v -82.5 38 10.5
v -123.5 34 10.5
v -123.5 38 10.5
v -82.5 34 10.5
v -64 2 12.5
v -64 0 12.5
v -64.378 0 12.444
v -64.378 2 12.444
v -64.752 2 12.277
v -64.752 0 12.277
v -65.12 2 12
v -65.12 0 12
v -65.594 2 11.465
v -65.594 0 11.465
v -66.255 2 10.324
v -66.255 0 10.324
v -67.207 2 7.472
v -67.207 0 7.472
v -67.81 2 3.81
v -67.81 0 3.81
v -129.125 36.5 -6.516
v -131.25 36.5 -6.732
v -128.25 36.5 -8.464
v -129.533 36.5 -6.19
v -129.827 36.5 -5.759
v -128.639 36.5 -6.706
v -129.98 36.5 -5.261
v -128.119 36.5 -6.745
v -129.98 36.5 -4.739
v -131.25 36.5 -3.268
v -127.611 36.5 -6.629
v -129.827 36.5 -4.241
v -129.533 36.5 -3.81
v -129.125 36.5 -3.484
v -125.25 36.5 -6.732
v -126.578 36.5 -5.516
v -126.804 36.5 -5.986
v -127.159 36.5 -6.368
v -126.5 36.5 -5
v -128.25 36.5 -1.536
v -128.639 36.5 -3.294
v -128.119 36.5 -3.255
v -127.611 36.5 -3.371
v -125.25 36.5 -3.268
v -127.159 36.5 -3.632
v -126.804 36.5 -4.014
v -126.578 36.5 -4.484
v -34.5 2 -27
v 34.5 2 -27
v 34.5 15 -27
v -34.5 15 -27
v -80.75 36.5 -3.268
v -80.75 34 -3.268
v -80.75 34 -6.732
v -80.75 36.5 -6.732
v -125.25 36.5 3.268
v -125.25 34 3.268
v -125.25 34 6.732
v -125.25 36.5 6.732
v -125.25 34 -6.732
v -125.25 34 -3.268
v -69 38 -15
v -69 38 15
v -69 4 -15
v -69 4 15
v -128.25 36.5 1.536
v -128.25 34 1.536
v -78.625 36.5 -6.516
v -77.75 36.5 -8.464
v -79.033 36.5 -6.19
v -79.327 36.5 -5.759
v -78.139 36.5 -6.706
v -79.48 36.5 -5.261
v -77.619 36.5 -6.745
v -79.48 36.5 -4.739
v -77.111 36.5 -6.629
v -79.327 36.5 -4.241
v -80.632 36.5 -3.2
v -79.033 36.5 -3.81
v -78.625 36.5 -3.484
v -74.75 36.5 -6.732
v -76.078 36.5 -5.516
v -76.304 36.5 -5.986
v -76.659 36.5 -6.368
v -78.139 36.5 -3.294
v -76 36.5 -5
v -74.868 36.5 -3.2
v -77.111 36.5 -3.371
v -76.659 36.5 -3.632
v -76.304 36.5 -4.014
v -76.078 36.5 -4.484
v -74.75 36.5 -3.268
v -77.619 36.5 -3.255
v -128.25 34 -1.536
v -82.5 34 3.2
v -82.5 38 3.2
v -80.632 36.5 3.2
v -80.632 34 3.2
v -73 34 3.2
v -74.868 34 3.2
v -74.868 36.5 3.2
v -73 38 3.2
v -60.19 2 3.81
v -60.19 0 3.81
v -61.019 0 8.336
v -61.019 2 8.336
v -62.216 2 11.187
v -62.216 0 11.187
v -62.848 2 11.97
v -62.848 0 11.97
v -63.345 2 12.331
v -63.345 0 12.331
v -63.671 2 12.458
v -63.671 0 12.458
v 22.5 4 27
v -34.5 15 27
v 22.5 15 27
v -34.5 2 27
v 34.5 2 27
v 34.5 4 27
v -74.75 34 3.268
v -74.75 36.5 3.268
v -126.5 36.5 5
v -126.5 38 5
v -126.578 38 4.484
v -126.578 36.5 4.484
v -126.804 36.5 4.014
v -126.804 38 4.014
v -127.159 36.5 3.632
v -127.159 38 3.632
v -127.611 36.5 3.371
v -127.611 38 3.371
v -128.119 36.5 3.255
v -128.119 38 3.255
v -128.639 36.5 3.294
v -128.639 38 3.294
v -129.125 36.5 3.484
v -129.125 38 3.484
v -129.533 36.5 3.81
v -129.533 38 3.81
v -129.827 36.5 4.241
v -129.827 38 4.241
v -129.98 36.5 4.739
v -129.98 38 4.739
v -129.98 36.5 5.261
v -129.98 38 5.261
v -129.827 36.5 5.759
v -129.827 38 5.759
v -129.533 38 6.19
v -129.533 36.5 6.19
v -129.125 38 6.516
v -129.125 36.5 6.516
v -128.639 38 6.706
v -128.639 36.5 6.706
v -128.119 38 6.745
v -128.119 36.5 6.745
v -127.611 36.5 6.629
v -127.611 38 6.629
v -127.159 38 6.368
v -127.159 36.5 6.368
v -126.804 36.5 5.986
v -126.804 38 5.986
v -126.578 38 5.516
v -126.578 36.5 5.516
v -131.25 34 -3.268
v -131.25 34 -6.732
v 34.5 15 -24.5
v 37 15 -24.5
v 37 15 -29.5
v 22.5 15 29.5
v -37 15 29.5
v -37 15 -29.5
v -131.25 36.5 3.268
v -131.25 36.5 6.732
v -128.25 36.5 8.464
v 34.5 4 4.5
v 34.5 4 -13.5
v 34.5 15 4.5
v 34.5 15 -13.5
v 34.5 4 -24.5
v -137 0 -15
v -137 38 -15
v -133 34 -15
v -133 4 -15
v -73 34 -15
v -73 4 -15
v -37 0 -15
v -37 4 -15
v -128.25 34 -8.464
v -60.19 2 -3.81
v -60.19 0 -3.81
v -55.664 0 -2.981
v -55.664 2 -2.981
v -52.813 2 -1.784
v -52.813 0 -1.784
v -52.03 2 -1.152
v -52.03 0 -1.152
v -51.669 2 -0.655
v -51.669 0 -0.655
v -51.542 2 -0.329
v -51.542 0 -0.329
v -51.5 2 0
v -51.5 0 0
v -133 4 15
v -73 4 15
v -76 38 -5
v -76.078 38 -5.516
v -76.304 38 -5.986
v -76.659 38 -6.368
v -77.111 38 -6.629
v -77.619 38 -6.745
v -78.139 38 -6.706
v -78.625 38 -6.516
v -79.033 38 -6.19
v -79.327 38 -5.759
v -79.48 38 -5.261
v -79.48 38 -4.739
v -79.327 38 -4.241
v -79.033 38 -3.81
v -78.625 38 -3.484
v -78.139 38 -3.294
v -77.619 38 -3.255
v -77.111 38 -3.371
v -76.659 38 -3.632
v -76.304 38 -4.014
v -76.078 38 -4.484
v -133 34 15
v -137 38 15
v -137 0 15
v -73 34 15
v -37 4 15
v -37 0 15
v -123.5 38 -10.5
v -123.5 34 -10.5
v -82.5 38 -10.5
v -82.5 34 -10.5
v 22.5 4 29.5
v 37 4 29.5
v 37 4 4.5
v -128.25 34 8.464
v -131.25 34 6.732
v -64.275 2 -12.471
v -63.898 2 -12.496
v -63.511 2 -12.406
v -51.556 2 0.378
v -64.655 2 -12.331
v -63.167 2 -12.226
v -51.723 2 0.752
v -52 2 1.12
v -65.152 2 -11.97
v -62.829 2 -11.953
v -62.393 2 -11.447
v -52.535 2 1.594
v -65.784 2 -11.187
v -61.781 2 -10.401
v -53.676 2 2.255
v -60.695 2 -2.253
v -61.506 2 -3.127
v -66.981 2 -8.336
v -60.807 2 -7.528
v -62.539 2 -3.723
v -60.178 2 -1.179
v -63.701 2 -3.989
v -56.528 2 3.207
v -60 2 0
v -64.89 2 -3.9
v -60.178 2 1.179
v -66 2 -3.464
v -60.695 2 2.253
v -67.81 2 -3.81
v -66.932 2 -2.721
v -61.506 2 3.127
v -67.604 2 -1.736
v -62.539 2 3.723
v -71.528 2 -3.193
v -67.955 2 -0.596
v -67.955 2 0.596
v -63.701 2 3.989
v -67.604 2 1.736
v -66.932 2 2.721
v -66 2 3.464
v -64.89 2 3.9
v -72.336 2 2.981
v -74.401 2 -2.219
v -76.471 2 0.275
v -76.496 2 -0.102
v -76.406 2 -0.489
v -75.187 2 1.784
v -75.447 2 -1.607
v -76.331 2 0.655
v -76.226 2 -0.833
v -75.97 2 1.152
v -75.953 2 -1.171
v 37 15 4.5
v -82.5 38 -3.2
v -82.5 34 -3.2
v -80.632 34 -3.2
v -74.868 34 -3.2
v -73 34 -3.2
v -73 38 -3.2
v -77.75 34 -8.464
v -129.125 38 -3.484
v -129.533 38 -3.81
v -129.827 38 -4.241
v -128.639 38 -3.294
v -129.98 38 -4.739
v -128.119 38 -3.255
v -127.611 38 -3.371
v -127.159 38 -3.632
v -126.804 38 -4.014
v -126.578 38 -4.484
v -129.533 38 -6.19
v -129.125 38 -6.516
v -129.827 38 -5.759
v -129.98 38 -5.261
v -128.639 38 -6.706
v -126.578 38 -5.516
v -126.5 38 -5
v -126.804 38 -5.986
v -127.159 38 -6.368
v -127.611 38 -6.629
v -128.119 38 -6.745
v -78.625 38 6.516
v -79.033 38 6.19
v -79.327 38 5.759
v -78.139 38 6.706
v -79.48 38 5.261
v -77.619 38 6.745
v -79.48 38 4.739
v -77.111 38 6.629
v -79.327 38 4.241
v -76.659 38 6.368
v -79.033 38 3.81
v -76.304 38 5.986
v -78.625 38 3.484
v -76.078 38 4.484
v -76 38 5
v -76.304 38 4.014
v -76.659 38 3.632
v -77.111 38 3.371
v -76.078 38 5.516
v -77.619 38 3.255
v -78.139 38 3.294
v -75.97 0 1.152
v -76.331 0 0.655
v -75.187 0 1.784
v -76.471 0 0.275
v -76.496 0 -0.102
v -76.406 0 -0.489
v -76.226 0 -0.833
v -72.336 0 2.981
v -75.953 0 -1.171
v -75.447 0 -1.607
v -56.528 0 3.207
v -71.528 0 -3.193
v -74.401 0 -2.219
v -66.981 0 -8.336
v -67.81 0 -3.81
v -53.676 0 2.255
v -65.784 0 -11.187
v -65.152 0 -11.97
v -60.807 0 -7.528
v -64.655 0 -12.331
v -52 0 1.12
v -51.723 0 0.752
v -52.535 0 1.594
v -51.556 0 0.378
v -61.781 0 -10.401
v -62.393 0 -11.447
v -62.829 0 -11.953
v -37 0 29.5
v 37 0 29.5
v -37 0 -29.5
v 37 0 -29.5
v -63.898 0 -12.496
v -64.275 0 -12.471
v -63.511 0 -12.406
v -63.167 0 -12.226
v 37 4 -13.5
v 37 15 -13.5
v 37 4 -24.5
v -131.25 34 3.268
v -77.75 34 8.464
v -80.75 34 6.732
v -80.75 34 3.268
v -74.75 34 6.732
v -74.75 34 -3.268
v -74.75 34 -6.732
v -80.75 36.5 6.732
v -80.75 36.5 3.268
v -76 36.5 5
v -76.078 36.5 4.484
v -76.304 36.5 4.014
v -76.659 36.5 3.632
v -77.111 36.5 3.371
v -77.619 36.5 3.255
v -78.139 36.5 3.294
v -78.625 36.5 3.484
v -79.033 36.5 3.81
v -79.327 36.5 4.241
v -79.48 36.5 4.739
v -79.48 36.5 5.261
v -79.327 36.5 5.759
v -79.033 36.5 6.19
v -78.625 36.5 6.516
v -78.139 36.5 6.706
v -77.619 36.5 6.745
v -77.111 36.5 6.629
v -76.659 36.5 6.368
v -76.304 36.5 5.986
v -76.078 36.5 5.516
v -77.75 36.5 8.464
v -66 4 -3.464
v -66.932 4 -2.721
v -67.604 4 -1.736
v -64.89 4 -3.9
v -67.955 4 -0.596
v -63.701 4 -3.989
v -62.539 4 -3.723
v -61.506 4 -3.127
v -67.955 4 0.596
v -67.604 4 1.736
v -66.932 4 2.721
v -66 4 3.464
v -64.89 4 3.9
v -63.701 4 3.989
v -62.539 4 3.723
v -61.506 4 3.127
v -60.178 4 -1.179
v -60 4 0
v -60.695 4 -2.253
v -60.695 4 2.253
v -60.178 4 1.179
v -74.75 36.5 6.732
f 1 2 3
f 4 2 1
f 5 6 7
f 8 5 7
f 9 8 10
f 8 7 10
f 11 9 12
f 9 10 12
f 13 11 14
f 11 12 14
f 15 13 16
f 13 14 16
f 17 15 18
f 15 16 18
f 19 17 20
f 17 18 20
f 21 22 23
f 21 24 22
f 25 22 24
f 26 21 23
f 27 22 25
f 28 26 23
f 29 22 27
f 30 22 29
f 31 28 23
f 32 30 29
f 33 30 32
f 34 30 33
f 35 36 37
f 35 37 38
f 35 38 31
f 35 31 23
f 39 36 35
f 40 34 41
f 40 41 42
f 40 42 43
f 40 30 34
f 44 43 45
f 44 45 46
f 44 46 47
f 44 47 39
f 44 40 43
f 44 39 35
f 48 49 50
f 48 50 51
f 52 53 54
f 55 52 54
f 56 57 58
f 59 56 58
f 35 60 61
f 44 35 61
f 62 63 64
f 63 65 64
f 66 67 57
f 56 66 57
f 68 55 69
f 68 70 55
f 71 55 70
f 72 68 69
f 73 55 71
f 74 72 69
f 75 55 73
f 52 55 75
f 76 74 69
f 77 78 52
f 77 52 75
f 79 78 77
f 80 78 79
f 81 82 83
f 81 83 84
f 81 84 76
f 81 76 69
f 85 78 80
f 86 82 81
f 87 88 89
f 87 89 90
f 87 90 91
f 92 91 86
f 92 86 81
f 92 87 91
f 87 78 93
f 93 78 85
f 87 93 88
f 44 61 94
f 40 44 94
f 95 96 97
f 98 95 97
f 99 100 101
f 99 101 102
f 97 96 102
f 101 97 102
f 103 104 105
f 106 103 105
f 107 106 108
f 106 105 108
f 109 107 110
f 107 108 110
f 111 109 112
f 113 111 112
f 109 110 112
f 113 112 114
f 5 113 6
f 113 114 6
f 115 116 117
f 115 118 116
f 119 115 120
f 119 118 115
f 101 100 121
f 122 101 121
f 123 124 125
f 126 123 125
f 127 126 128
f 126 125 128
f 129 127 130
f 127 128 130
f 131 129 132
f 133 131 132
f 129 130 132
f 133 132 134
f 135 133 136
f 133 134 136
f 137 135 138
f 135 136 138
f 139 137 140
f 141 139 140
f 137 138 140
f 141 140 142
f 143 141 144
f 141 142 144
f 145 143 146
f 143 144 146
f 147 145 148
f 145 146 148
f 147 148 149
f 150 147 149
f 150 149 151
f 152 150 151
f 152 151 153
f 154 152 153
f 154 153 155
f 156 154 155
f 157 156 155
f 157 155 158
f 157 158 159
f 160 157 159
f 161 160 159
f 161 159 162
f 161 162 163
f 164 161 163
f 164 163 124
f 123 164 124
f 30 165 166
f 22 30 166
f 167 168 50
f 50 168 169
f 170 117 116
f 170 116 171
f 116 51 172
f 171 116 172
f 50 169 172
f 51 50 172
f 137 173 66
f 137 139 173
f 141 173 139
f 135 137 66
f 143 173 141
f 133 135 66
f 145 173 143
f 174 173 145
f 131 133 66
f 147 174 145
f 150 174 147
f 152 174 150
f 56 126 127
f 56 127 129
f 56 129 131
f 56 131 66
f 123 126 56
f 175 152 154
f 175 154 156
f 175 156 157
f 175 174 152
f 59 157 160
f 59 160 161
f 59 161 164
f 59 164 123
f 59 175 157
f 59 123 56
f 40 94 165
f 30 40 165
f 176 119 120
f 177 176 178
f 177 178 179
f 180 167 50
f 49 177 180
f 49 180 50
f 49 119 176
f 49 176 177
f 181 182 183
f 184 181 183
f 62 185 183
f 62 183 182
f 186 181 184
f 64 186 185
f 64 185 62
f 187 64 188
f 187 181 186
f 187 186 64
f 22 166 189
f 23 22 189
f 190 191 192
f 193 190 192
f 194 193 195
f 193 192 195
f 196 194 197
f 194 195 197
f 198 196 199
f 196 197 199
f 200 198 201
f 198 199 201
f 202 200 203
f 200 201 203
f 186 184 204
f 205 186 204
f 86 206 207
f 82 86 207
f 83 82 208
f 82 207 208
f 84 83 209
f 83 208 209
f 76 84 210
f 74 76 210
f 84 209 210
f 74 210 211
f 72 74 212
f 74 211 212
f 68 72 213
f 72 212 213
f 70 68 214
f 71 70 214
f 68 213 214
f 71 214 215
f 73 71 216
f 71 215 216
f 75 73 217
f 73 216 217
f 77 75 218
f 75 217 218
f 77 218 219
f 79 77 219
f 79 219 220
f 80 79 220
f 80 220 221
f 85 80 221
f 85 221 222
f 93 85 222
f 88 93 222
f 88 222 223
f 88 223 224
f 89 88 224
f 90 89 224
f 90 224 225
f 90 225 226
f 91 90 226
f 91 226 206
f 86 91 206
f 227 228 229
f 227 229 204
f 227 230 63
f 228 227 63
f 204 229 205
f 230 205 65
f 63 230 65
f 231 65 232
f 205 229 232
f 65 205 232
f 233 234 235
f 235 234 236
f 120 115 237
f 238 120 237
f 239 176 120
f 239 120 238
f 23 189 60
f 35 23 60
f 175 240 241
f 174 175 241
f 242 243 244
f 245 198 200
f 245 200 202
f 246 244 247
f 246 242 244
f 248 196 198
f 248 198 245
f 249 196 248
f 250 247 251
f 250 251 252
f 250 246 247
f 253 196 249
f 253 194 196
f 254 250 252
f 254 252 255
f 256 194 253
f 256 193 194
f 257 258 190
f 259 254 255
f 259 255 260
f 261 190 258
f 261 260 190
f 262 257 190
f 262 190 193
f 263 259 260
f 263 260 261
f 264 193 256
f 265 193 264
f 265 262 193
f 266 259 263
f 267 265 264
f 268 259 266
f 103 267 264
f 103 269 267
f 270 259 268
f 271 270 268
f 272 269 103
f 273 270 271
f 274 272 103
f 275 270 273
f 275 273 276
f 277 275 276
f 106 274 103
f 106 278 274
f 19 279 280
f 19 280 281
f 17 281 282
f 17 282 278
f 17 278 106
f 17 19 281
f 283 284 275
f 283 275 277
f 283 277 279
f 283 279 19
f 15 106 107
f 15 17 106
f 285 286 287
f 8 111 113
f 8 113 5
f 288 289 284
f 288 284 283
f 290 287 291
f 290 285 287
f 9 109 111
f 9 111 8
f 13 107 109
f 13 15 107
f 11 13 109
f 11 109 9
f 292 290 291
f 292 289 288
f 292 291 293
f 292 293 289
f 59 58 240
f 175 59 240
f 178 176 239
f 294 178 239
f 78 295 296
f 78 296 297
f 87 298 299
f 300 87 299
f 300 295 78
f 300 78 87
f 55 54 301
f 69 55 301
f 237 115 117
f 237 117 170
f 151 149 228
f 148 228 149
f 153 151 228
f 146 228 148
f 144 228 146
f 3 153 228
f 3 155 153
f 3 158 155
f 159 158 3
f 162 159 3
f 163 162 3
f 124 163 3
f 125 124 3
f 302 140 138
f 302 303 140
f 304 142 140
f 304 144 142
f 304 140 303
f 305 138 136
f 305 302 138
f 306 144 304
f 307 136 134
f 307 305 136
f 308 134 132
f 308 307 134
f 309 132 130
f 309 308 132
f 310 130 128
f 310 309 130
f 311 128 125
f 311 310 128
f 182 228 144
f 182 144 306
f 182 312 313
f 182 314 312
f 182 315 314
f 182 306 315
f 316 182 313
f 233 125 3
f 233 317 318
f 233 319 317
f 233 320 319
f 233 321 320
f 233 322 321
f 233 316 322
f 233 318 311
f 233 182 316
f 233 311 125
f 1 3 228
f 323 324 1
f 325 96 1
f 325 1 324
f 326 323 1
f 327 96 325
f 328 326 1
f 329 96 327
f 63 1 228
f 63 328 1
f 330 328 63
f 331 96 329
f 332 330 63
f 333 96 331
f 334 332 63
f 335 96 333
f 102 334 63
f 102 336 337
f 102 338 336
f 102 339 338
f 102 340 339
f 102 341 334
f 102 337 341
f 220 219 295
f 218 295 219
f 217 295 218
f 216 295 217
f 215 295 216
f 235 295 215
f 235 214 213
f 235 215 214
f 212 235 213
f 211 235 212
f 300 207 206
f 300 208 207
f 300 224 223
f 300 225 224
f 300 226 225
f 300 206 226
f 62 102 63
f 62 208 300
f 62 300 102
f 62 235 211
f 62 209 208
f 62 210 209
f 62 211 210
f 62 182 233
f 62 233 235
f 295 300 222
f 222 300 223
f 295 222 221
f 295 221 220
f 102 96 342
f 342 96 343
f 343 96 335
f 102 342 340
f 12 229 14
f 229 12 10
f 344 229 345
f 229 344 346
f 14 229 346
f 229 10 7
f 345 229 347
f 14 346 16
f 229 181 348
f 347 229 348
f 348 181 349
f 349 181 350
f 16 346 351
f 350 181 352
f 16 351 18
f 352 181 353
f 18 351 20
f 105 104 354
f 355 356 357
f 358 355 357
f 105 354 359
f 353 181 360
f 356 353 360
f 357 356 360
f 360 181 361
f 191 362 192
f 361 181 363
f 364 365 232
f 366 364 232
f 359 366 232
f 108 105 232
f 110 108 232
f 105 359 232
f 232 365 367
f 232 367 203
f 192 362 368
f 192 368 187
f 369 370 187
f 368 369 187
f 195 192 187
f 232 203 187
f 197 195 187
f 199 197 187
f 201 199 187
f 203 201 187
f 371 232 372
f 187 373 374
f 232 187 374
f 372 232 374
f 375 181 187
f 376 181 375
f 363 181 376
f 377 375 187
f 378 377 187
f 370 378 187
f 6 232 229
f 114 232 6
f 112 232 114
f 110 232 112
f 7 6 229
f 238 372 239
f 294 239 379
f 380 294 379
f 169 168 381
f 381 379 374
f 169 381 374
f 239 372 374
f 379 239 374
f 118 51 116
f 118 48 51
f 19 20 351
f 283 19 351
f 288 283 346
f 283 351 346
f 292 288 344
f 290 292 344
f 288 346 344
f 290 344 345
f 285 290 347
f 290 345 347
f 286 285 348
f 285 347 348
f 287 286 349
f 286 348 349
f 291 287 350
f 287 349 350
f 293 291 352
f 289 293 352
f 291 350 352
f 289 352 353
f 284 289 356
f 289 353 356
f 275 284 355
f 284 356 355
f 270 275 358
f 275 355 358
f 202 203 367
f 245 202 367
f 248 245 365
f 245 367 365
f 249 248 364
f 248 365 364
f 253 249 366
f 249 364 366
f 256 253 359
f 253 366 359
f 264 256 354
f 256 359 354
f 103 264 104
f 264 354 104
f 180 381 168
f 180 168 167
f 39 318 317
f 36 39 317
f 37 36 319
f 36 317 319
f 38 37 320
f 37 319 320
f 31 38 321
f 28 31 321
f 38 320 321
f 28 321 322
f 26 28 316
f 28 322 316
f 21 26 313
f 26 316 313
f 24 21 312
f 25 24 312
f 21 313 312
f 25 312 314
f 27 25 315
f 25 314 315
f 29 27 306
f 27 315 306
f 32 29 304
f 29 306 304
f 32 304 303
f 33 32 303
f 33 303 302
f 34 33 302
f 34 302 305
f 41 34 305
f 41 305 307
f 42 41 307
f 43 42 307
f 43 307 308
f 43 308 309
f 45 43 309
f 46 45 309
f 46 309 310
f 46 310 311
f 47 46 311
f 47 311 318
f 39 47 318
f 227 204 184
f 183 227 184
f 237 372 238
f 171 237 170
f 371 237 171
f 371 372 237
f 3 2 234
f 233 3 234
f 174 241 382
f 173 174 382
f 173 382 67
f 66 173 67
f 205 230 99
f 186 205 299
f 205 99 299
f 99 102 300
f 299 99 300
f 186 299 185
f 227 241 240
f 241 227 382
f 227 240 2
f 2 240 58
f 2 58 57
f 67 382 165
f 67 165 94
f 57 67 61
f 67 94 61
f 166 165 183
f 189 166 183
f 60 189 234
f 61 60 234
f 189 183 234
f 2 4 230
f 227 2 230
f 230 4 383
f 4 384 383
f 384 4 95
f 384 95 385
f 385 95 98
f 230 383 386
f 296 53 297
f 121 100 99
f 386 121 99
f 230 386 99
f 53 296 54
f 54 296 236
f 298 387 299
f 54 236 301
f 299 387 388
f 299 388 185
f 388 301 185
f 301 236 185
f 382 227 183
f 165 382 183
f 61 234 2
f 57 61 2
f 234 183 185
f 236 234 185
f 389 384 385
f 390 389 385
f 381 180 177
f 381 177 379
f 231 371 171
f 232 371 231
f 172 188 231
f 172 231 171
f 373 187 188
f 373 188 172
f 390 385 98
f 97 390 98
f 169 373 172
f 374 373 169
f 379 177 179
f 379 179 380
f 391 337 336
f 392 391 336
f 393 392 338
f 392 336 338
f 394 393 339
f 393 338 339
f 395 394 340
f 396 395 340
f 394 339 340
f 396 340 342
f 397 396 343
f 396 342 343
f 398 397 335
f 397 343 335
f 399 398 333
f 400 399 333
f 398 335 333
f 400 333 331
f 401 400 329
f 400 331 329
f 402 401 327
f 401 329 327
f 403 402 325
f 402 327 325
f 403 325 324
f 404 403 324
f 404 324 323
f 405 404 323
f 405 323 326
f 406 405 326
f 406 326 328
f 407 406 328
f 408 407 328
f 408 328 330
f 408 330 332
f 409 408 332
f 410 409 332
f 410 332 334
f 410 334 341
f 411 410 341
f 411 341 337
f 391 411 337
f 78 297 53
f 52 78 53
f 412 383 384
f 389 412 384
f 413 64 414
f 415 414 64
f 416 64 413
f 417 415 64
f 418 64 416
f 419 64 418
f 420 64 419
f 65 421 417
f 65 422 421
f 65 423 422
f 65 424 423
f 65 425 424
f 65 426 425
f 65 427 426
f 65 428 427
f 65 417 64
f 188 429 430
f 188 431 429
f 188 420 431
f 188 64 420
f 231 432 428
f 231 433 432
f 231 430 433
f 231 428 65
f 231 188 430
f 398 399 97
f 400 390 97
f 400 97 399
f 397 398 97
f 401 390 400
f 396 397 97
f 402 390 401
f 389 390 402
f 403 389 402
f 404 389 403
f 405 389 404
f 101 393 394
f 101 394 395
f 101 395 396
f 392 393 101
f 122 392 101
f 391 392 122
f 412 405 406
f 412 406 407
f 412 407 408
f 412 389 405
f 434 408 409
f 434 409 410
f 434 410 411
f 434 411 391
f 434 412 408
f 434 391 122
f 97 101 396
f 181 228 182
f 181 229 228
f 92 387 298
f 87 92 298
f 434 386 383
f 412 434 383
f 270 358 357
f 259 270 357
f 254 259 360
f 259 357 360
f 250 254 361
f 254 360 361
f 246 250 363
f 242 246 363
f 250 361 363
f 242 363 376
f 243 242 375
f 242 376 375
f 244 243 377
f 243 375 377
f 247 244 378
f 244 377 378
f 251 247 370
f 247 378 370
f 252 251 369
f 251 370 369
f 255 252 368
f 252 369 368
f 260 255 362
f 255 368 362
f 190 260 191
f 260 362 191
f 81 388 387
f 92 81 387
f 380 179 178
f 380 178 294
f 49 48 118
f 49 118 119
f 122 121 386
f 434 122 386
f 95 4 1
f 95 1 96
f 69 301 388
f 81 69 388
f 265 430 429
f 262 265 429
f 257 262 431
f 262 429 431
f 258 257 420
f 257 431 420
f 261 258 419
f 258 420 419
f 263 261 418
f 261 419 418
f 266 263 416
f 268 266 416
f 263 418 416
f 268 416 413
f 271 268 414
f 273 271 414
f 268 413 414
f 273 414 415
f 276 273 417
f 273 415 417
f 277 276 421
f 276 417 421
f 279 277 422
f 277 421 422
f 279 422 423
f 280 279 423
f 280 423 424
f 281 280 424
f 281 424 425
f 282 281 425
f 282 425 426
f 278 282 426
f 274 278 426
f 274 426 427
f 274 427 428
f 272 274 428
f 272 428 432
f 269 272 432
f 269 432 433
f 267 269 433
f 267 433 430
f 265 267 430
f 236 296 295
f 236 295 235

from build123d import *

# Parameters (mm, degrees)
SKETCH1_W           = 74
SKETCH1_H           = 59
BOSS_EXTRUDE1_DEPTH = 2
SKETCH2_W           = 74
SKETCH2_H           = 59
SKETCH2_W_2         = 69
SKETCH2_H_2         = 54
BOSS_EXTRUDE2_DEPTH = 2
SKETCH3_W           = 2.5
SKETCH3_H           = 18
BOSS_EXTRUDE3_DEPTH = 11
SKETCH4_W           = 30
SKETCH4_H           = 4
BOSS_EXTRUDE4_DEPTH = 100
SKETCH5_W           = 4
SKETCH5_H           = 30
BOSS_EXTRUDE5_DEPTH = 30
SKETCH6_W           = 68
SKETCH6_H           = 30
SKETCH6_W_2         = 41
SKETCH6_H_2         = 21
BOSS_EXTRUDE6_DEPTH = 4
SKETCH7_R           = 1.75
SKETCH7_W           = 9.5
SKETCH7_H           = 6.4
CUT_EXTRUDE1_DEPTH  = 5
CUT_EXTRUDE2_DEPTH  = 2.5
SKETCH9_R           = 4
CUT_EXTRUDE3_DEPTH  = 10
SKETCH10_RX         = 12.5
SKETCH10_RY         = 4
CUT_EXTRUDE4_DEPTH  = 2


with BuildPart() as part:
    # Sketch1 → Boss-Extrude1 (new body)
    with BuildSketch(Plane(origin=(0, 0, 0), x_dir=(1, 0, 0), z_dir=(0, 1, 0))):
        Rectangle(SKETCH1_W, SKETCH1_H)
    extrude(amount=BOSS_EXTRUDE1_DEPTH)

    # Sketch2 → Boss-Extrude2 (add)
    with BuildSketch(Plane(origin=(0, 2, 0), x_dir=(1, 0, 0), z_dir=(0, 1, 0))):
        Rectangle(SKETCH2_W, SKETCH2_H)
        Rectangle(SKETCH2_W_2, SKETCH2_H_2, mode=Mode.SUBTRACT)
    extrude(amount=BOSS_EXTRUDE2_DEPTH)

    # Sketch3 → Boss-Extrude3 (add)
    with BuildSketch(Plane(origin=(0, 4, 0), x_dir=(1, 0, 0), z_dir=(0, 1, 0))):
        Polygon((22.5, -27), (22.5, -29.5), (-37, -29.5), (-37, 29.5), (37, 29.5), (37, 24.5), (34.5, 24.5), (34.5, 27), (-34.5, 27), (-34.5, -27), align=None)
        with Locations((35.75, 4.5)):
            Rectangle(SKETCH3_W, SKETCH3_H)
    extrude(amount=BOSS_EXTRUDE3_DEPTH)

    # Sketch4 → Boss-Extrude4 (add)
    with BuildSketch(Plane.ZY.offset(37)):
        with Locations((0, 2)):
            Rectangle(SKETCH4_W, SKETCH4_H)
    extrude(amount=BOSS_EXTRUDE4_DEPTH)

    # Sketch5 → Boss-Extrude5 (add)
    with BuildSketch(Plane(origin=(0, 4, 0), x_dir=(1, 0, 0), z_dir=(0, 1, 0))):
        with Locations((-71, 0)):
            Rectangle(SKETCH5_W, SKETCH5_H)
        with Locations((-135, 0)):
            Rectangle(SKETCH5_W, SKETCH5_H)
    extrude(amount=BOSS_EXTRUDE5_DEPTH)

    # Sketch6 → Boss-Extrude6 (add)
    with BuildSketch(Plane(origin=(0, 34, 0), x_dir=(1, 0, 0), z_dir=(0, 1, 0))):
        with Locations((-103, 0)):
            Rectangle(SKETCH6_W, SKETCH6_H)
        with Locations((-103, 0)):
            Rectangle(SKETCH6_W_2, SKETCH6_H_2, mode=Mode.SUBTRACT)
    extrude(amount=BOSS_EXTRUDE6_DEPTH)

    # Sketch7 → Cut-Extrude1 (cut)
    with BuildSketch(Plane(origin=(0, 38, 0), x_dir=(1, 0, 0), z_dir=(0, 1, 0))):
        with Locations((-128.25, 5)):
            Circle(SKETCH7_R)
        with Locations((-77.75, 5)):
            Circle(SKETCH7_R)
        with Locations((-77.75, -5)):
            Circle(SKETCH7_R)
        with Locations((-128.25, -5)):
            Circle(SKETCH7_R)
        with Locations((-77.75, 0)):
            Rectangle(SKETCH7_W, SKETCH7_H)
    extrude(amount=-CUT_EXTRUDE1_DEPTH, mode=Mode.SUBTRACT)

    # Sketch8 → Cut-Extrude2 (cut)
    with BuildSketch(Plane.XZ.offset(-34)):
        Polygon((-131.25, 6.732050808), (-131.25, 3.267949192), (-128.25, 1.535898385), (-125.25, 3.267949192), (-125.25, 6.732050808), (-128.25, 8.464101615), align=None)
        Polygon((-128.25, -1.535898385), (-131.25, -3.267949192), (-131.25, -6.732050808), (-128.25, -8.464101615), (-125.25, -6.732050808), (-125.25, -3.267949192), align=None)
        Polygon((-74.75, 3.267949192), (-74.75, 6.732050808), (-77.75, 8.464101615), (-80.75, 6.732050808), (-80.75, 3.267949192), (-77.75, 1.535898385), align=None)
        Polygon((-74.75, -6.732050808), (-74.75, -3.267949192), (-77.75, -1.535898385), (-80.75, -3.267949192), (-80.75, -6.732050808), (-77.75, -8.464101615), align=None)
    extrude(amount=-CUT_EXTRUDE2_DEPTH, mode=Mode.SUBTRACT)

    # Sketch9 → Cut-Extrude3 (cut)
    with BuildSketch(Plane(origin=(0, 4, 0), x_dir=(1, 0, 0), z_dir=(0, 1, 0))):
        with Locations((-64, 0)):
            Circle(SKETCH9_R)
    extrude(amount=-CUT_EXTRUDE3_DEPTH, mode=Mode.SUBTRACT)

    # Sketch10 → Cut-Extrude4 (cut)
    with BuildSketch(Plane.XZ):
        with Locations(Location((-64, 0), (0, 0, 90))):
            Ellipse(SKETCH10_RX, SKETCH10_RY)
        with Locations((-64, 0)):
            Ellipse(SKETCH10_RX, SKETCH10_RY)
    extrude(amount=-CUT_EXTRUDE4_DEPTH, mode=Mode.SUBTRACT)


solid = part.part
